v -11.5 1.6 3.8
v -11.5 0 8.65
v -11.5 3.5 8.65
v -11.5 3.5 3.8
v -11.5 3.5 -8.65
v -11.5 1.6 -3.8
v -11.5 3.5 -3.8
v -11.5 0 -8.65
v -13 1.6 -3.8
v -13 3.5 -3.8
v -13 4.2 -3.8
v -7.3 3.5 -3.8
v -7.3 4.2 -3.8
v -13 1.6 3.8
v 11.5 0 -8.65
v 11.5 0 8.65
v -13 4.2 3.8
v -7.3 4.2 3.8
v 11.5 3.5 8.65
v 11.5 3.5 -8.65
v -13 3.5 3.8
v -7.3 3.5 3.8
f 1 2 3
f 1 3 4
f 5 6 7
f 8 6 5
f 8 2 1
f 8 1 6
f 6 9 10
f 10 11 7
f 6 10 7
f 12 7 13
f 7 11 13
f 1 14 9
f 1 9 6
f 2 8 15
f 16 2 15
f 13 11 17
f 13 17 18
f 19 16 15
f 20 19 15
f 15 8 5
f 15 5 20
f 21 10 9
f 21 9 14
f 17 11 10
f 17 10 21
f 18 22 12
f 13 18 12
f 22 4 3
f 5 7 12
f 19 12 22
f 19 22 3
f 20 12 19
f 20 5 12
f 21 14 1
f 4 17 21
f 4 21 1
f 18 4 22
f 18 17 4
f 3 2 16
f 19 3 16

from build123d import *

# Parameters (mm, degrees)
SKETCH_1_W      = 23
SKETCH_1_H      = 17.3
EXTRUDE_1_DEPTH = 3.5
SKETCH_2_W      = 5.700101794
SKETCH_2_H      = 7.6
EXTRUDE_2_DEPTH = 0.7
SKETCH_3_W      = 1.500050897
SKETCH_3_H      = 7.6
EXTRUDE_3_DEPTH = 1.9


with BuildPart() as part:
    # Эскиз1 → Бобышка-Вытянуть1 (new body)
    with BuildSketch(Plane(origin=(0, 0, 0), x_dir=(1, 0, 0), z_dir=(0, 1, 0))):
        Rectangle(SKETCH_1_W, SKETCH_1_H)
    extrude(amount=EXTRUDE_1_DEPTH)

    # Эскиз2 → Бобышка-Вытянуть2 (add)
    with BuildSketch(Plane(origin=(0, 3.5, 0), x_dir=(1, 0, 0), z_dir=(0, 1, 0))):
        with Locations((-10.15, 0)):
            Rectangle(SKETCH_2_W, SKETCH_2_H)
    extrude(amount=EXTRUDE_2_DEPTH)

    # Эскиз3 → Бобышка-Вытянуть3 (add)
    with BuildSketch(Plane.XZ.offset(-3.5)):
        with Locations((-12.250025449, 0)):
            Rectangle(SKETCH_3_W, SKETCH_3_H)
    extrude(amount=EXTRUDE_3_DEPTH)


solid = part.part
